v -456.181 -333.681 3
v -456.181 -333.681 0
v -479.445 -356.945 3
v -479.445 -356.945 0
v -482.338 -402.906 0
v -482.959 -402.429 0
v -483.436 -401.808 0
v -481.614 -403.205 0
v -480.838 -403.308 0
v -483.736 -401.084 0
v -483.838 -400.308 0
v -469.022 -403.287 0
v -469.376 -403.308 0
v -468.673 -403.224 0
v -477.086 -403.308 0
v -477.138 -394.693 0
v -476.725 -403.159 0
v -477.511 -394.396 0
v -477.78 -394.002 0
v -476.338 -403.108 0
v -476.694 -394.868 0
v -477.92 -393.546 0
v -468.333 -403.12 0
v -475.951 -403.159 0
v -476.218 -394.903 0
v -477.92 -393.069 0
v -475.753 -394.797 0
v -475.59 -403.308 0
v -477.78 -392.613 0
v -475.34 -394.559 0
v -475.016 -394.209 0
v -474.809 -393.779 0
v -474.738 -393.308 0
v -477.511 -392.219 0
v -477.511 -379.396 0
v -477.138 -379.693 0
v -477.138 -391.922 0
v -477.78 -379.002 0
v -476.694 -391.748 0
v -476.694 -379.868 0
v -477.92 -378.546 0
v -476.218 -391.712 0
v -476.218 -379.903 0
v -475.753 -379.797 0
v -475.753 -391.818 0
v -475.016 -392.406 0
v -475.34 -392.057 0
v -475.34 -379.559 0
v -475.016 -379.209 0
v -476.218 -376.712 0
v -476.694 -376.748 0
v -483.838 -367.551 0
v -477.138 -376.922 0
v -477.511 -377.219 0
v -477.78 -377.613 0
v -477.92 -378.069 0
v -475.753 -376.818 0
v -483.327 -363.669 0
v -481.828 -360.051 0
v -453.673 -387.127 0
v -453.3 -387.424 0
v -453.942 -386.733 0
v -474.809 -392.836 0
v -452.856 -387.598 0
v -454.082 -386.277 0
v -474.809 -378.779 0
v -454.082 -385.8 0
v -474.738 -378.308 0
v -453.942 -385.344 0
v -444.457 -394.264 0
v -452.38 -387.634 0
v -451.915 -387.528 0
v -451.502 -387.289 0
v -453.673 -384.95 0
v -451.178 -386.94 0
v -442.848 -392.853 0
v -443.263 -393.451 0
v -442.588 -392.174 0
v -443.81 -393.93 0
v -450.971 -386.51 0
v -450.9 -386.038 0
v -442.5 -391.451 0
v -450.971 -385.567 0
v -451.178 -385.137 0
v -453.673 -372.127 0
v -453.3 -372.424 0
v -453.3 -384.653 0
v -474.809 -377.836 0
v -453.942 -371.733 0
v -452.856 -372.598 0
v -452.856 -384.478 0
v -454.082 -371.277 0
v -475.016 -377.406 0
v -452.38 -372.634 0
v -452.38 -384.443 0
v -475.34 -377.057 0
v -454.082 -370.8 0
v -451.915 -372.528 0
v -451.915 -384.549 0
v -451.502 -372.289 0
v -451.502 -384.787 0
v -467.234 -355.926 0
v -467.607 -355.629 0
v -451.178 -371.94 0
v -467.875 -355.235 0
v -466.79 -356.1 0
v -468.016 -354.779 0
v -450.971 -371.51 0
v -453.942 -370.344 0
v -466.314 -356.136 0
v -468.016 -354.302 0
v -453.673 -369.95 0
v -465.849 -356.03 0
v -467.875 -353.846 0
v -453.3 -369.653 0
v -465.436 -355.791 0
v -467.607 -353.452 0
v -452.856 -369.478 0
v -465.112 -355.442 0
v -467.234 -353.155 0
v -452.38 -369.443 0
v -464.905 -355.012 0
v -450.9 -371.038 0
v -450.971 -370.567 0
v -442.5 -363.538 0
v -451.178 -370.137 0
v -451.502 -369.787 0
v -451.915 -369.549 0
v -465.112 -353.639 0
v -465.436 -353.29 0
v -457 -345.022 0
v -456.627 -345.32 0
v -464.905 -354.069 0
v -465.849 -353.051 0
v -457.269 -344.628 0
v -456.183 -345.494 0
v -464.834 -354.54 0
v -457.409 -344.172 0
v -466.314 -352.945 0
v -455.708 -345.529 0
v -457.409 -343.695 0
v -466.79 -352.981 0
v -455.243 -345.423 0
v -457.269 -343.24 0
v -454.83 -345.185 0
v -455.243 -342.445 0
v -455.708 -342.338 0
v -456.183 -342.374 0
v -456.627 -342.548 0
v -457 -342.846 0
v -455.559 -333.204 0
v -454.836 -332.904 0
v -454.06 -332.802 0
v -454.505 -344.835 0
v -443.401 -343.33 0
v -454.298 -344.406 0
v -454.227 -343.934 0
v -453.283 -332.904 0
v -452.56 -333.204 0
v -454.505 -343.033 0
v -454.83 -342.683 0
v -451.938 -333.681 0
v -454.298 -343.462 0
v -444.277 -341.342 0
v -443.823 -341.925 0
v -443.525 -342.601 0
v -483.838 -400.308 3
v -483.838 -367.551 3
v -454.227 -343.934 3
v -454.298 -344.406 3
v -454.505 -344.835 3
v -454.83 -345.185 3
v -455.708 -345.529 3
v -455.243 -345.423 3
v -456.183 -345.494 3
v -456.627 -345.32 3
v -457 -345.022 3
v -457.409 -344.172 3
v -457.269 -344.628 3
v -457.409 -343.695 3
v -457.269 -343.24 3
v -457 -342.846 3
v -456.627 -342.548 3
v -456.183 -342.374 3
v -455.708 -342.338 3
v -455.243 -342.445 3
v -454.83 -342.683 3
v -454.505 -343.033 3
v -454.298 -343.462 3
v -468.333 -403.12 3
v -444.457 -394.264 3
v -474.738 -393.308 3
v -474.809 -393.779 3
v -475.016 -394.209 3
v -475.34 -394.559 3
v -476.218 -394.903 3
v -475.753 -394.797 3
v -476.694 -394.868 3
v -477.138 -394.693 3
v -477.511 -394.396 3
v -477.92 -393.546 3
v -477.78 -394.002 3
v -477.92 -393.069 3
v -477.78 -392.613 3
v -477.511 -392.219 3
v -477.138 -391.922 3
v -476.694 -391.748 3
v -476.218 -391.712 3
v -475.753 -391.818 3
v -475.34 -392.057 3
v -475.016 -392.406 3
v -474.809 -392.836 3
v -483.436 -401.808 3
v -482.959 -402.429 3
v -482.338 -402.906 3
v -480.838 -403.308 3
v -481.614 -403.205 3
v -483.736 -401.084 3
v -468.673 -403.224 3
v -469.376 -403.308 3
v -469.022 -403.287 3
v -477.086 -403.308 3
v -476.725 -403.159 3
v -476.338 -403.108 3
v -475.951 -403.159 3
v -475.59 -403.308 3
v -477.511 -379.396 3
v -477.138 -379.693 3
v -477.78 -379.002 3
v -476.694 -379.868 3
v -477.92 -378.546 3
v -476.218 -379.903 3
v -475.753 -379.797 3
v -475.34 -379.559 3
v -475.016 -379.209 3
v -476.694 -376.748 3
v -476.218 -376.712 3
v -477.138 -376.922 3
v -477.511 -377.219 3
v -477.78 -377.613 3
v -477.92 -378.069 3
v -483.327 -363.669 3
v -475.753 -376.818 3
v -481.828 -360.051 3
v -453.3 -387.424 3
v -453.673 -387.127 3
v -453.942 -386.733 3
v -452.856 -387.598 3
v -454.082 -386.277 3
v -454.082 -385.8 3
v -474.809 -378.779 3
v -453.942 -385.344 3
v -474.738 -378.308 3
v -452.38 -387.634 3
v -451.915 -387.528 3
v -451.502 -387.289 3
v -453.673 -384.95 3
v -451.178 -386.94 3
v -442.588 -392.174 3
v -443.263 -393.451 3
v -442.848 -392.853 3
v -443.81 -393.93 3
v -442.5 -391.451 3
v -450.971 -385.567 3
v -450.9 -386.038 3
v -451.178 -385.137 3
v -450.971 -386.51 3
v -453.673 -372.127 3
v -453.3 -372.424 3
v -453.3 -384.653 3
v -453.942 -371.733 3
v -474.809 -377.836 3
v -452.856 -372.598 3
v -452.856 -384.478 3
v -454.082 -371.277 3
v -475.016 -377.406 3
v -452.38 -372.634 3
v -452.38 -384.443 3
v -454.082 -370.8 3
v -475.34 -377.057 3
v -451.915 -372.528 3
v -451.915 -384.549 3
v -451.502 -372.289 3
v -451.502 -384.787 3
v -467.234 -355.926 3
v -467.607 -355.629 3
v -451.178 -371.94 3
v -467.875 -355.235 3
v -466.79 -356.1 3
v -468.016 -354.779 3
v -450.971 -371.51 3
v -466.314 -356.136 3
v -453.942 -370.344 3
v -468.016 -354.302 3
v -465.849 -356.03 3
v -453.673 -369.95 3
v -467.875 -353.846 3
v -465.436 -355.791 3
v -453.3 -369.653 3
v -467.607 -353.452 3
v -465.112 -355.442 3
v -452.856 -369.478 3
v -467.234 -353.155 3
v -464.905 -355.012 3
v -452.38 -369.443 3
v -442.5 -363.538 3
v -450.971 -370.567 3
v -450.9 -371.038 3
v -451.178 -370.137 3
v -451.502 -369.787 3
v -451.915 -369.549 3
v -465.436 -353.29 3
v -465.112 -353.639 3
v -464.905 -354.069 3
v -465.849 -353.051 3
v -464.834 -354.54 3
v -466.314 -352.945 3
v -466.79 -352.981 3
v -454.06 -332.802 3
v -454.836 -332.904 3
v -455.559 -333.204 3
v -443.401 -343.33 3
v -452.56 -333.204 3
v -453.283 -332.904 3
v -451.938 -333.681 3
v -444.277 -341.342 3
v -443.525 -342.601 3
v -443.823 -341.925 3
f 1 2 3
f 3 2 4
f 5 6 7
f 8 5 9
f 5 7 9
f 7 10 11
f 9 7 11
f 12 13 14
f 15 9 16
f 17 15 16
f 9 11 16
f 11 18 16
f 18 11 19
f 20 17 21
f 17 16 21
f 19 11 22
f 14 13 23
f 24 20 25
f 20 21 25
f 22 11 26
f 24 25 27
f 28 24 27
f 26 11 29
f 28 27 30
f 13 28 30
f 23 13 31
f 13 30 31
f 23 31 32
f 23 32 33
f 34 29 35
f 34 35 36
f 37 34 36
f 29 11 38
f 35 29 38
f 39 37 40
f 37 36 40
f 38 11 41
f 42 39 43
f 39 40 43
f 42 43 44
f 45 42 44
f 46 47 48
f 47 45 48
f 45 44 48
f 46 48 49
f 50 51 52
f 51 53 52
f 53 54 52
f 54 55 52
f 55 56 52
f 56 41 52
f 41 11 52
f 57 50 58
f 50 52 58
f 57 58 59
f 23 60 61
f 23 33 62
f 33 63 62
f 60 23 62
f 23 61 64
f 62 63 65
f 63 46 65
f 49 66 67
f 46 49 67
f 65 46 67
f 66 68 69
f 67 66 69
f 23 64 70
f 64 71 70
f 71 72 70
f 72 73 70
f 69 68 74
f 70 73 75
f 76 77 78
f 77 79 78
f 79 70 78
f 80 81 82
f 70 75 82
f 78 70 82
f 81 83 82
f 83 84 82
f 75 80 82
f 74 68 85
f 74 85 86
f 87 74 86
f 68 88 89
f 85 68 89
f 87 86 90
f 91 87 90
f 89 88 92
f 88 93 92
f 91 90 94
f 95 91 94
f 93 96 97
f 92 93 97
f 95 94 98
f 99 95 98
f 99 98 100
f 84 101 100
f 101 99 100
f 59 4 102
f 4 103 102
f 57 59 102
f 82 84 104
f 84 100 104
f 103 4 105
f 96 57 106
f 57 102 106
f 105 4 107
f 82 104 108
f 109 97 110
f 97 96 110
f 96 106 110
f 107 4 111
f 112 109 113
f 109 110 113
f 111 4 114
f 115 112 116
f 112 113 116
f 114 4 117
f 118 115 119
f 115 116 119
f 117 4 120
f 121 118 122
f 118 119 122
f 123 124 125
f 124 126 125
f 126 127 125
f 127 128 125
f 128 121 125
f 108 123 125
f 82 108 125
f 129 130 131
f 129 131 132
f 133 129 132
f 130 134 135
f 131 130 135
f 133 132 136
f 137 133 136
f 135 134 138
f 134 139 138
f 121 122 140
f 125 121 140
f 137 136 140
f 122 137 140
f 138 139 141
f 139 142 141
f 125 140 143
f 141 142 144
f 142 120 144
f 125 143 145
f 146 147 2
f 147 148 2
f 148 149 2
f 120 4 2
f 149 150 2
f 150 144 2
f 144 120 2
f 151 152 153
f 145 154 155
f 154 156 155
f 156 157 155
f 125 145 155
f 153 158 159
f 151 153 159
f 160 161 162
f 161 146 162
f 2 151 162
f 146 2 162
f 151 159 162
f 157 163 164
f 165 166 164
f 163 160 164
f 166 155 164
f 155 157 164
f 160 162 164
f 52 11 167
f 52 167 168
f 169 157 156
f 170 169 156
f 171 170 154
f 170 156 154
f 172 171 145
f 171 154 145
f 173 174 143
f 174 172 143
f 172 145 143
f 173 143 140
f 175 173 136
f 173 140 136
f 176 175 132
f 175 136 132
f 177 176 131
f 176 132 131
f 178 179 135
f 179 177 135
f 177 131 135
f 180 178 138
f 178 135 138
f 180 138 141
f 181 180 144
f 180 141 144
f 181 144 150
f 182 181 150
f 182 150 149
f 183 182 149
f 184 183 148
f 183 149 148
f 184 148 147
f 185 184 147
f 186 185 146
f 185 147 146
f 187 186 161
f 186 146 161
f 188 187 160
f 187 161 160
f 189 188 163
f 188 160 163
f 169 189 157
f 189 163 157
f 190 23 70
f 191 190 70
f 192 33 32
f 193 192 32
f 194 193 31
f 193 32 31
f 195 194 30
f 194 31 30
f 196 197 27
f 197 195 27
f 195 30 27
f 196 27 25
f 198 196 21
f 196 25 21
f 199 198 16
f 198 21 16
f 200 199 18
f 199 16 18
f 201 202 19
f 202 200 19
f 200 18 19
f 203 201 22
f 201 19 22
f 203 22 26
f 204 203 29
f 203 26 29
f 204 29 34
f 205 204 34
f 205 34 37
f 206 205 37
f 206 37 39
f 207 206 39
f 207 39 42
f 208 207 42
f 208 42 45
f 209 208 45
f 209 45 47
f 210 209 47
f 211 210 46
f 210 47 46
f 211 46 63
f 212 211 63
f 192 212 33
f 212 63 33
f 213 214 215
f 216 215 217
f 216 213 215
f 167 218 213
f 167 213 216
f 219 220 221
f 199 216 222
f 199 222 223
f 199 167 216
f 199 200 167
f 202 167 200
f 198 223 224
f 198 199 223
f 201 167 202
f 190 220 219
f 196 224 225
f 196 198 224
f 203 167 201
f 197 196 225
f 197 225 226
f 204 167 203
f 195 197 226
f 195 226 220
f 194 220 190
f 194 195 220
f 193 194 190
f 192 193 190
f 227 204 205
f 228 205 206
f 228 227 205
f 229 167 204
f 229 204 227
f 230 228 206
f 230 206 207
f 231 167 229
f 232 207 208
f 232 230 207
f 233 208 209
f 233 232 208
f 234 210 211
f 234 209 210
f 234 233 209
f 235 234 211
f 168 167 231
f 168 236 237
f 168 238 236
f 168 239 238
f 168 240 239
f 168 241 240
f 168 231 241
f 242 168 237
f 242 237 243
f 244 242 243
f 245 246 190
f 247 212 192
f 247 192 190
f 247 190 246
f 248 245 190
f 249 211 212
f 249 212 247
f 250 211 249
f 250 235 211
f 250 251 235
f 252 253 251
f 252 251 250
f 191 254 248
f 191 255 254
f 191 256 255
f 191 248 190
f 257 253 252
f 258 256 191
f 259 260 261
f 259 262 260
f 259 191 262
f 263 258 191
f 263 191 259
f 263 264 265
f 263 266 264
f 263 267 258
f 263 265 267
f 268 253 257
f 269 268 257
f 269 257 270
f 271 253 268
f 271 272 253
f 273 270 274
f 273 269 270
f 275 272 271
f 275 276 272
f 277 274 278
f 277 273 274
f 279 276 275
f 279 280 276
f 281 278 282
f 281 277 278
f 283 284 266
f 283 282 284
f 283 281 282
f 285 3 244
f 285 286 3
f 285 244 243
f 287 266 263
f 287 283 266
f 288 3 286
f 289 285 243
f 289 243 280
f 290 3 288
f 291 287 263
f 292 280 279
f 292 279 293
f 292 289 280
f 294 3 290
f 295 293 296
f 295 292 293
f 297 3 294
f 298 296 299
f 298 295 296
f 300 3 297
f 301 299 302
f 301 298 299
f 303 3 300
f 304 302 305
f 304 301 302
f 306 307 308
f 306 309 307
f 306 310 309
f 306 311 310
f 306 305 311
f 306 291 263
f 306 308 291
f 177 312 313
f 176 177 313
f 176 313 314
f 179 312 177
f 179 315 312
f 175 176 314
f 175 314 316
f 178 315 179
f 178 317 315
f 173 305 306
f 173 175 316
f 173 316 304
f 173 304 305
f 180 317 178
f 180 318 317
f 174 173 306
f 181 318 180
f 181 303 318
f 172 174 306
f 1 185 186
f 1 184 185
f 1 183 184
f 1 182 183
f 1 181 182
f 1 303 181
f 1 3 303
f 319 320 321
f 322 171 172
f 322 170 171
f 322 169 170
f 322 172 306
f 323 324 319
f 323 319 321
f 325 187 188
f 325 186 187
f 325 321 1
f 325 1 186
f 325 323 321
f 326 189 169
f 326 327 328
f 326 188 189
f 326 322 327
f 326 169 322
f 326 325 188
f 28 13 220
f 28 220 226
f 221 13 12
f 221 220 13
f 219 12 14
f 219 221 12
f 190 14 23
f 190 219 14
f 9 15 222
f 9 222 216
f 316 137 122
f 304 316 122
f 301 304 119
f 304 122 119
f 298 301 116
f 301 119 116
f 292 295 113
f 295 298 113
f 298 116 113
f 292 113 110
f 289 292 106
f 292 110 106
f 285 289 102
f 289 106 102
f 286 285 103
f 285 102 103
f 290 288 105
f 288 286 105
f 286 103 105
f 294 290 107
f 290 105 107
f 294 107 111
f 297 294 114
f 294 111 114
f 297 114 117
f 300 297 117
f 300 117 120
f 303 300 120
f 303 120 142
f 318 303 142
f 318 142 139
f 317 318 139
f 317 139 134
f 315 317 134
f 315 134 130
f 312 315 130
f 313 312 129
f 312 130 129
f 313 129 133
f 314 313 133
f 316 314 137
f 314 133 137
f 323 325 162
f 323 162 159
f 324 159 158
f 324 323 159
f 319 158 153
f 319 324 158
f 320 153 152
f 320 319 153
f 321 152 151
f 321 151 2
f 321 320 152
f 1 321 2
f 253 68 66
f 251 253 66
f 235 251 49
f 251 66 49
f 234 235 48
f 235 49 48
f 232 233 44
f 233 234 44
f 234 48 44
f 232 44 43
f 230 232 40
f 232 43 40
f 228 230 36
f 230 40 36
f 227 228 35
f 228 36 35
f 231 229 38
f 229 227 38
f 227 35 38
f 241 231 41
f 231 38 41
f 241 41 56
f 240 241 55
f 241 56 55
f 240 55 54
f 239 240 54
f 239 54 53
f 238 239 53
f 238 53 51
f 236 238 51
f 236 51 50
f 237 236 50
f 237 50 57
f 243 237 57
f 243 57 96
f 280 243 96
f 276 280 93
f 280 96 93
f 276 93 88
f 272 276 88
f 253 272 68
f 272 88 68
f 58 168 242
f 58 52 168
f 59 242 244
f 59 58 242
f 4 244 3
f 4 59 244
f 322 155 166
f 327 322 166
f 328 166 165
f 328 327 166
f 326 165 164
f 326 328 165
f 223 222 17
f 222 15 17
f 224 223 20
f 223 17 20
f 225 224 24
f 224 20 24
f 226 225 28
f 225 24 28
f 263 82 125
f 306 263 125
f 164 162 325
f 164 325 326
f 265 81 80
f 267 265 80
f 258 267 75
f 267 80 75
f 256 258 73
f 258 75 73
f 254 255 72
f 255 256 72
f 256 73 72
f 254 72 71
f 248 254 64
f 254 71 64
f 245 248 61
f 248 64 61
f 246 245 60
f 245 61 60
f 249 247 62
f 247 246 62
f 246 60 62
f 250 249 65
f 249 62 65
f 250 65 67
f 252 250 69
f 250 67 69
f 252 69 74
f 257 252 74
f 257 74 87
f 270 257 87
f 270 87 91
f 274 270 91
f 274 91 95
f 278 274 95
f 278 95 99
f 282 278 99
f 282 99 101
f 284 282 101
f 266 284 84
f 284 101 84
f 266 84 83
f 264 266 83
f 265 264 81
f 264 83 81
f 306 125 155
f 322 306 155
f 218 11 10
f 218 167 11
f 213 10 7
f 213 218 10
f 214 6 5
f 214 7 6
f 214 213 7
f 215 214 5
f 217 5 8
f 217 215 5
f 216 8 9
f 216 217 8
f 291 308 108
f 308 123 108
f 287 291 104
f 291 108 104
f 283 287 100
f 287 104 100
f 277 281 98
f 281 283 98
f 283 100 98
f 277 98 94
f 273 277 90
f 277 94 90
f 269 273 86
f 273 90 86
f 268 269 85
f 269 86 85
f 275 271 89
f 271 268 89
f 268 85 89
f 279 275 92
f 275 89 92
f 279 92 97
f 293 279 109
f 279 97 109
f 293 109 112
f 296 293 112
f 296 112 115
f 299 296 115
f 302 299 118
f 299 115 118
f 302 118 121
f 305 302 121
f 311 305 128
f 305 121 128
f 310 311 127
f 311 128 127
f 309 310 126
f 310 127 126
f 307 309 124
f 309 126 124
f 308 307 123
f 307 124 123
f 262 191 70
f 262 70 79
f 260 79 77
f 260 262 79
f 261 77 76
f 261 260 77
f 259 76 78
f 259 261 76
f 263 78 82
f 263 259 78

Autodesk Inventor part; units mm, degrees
ref_plane "YZ Plane" through (0, 0, 0) normal (1, 0, 0) x (0, 1, 0)
ref_plane "XZ Plane" through (0, 0, 0) normal (0, 1, 0) x (-1, 0, 0)
ref_plane "XY Plane" through (0, 0, 0) normal (0, 0, 1) x (1, 0, 0)
sketch "スケッチ1" plane through (0, 0, 0) normal (0, 0, 1) x (1, 0, 0)
  line L0 (67.5, 17.5) -> (-67.5, 17.5) construction
  line L1 (-67.5, 17.5) -> (-67.5, -17.5) construction
  line L2 (-67.5, -17.5) -> (67.5, -17.5) construction
  line L3 (67.5, -17.5) -> (67.5, 17.5) construction
  line L4 (67.5, 17.5) -> (-67.5, -17.5) construction
  line L5 (-67.5, 17.5) -> (67.5, -17.5) construction
  circle A0 centre (-60, 35) radius 1.6
  circle A1 centre (-70, 35) radius 1.6
  line L6 (-77.5, 27.5) -> (-53, 27.5)
  line L7 (-53, 27.5) -> (-53, 42.5)
  line L8 (-53, 42.5) -> (-80, 42.5) construction
  line L9 (-77.5, 27.5) -> (-77.5, -27.5)
  line L10 (-77.5, -27.5) -> (-53, -27.5)
  line L11 (-53, -27.5) -> (-53, -42.5)
  line L12 (-53, -42.5) -> (-80, -42.5)
  circle A2 centre (-60, -35) radius 1.6
  circle A3 centre (-70, -35) radius 1.6
  circle A4 centre (-80, -35) radius 1.6
  line L13 (124.2308, -31.7536) -> (484.5935, -392.1164)
  line L14 (484.5935, -392.1164) -> (488.7129, -553.575)
  line L15 (-80, 21.2868) -> (-468.838, -367.5512) construction
  line L16 (-468.838, -367.5512) -> (-479.4446, -356.9446) construction
  line L17 (-479.4446, -356.9446) -> (-90.6066, 31.8934) construction
  line L18 (-90.6066, 31.8934) -> (-80, 21.2868) construction
  line L19 (-80, 42.5) -> (-80, 5.3052) construction
  circle A5 centre (-92.3744, 19.519) radius 1.6
  circle A6 centre (-102.981, 8.9124) radius 1.6
  circle A7 centre (-113.5876, -1.6942) radius 1.6
  line L20 (-92.3744, 19.519) -> (-113.5876, -1.6942) construction
  circle A8 centre (-466.4339, -354.5405) radius 1.6
  circle A9 centre (-455.8273, -343.9339) radius 1.6
  line L21 (-388.4374, -772.2067) -> (-358.1265, -754.7067) construction
  line L22 (-358.1265, -754.7067) -> (-425.6265, -637.7933) construction
  line L23 (-455.9374, -655.2933) -> (-358.1265, -754.7067) construction
  line L24 (-388.4374, -772.2067) -> (-425.6265, -637.7933) construction
  line L25 (-455.9374, -655.2933) -> (-388.4374, -772.2067) construction
  line L26 (-425.6265, -637.7933) -> (-455.9374, -655.2933) construction
  line L27 (455.9374, -655.2933) -> (425.6265, -637.7933) construction
  line L28 (425.6265, -637.7933) -> (358.1265, -754.7067) construction
  line L29 (388.4374, -772.2067) -> (425.6265, -637.7933) construction
  line L30 (455.9374, -655.2933) -> (358.1265, -754.7067) construction
  line L31 (388.4374, -772.2067) -> (455.9374, -655.2933) construction
  line L32 (358.1265, -754.7067) -> (388.4374, -772.2067) construction
  line L33 (0, 0) -> (0, -263.4473) construction
  circle A10 centre (80, -35) radius 1.6
  line L34 (67.5, 17.5) -> (67.5, -17.5) construction
  line L35 (77.5, 27.5) -> (53, 27.5)
  line L36 (77.5, 27.5) -> (77.5, -27.5)
  line L37 (77.5, -27.5) -> (53, -27.5)
  circle A11 centre (60, -35) radius 1.6
  circle A12 centre (70, -35) radius 1.6
  line L38 (53, -27.5) -> (53, -42.5)
  line L39 (53, -42.5) -> (80, -42.5)
  circle A13 centre (60, 35) radius 1.6
  circle A14 centre (70, 35) radius 1.6
  line L40 (80, 42.5) -> (80, 5.3052) construction
  line L41 (53, 42.5) -> (80, 42.5)
  line L42 (53, 27.5) -> (53, 42.5)
  line L43 (-392.0976, -785.867) -> (-404.3476, -764.6493)
  line L44 (-388.4374, -772.2067) -> (-358.1265, -754.7067) construction
  line L45 (-392.0976, -785.867) -> (-344.4662, -758.367)
  circle A15 centre (-336.7211, -756.782) radius 1.6
  circle A16 centre (-341.7211, -748.1218) radius 1.6
  line L46 (-343.7259, -729.6493) -> (-330.2259, -753.032)
  circle A17 centre (-346.7211, -739.4615) radius 1.6
  line L47 (-356.7162, -737.1493) -> (-343.7259, -729.6493)
  line L48 (-344.4662, -758.367) -> (-356.7162, -737.1493)
  circle A18 centre (-407.3428, -774.4615) radius 1.6
  circle A19 centre (-402.3428, -783.1218) radius 1.6
  line L49 (-404.3476, -764.6493) -> (-417.338, -772.1493)
  line L50 (-417.338, -772.1493) -> (-403.838, -795.532)
  line L51 (-403.838, -795.532) -> (-371.6264, -776.9346) construction
  line L52 (-425.6265, -637.7933) -> (-455.9374, -655.2933) construction
  line L53 (-409.7162, -645.3507) -> (-396.7259, -637.8507)
  circle A20 centre (-406.7211, -635.5385) radius 1.6
  line L54 (-455.9374, -655.2933) -> (-425.6265, -637.7933) construction
  circle A21 centre (-411.7211, -626.8782) radius 1.6
  line L55 (-469.5976, -651.633) -> (-421.9662, -624.133)
  line L56 (-421.9662, -624.133) -> (-409.7162, -645.3507)
  line L57 (-396.7259, -637.8507) -> (-410.2259, -614.468)
  circle A22 centre (-416.7211, -618.218) radius 1.6
  line L58 (-469.5976, -651.633) -> (-457.3476, -672.8507)
  circle A23 centre (-467.3428, -670.5385) radius 1.6
  circle A24 centre (-472.3428, -661.8782) radius 1.6
  line L59 (-483.838, -656.968) -> (-451.6264, -638.3706) construction
  line L60 (-470.338, -680.3507) -> (-483.838, -656.968)
  line L61 (-457.3476, -672.8507) -> (-470.338, -680.3507)
  line L62 (469.5976, -651.633) -> (457.3476, -672.8507)
  line L63 (455.9374, -655.2933) -> (425.6265, -637.7933) construction
  line L64 (469.5976, -651.633) -> (421.9662, -624.133)
  circle A25 centre (416.7211, -618.218) radius 1.6
  circle A26 centre (411.7211, -626.8782) radius 1.6
  line L65 (396.7259, -637.8507) -> (410.2259, -614.468)
  circle A27 centre (406.7211, -635.5385) radius 1.6
  line L66 (409.7162, -645.3507) -> (396.7259, -637.8507)
  line L67 (421.9662, -624.133) -> (409.7162, -645.3507)
  circle A28 centre (467.3428, -670.5385) radius 1.6
  circle A29 centre (472.3428, -661.8782) radius 1.6
  line L68 (457.3476, -672.8507) -> (470.338, -680.3507)
  line L69 (470.338, -680.3507) -> (483.838, -656.968)
  line L70 (483.838, -656.968) -> (451.6264, -638.3706) construction
  line L71 (358.1265, -754.7067) -> (388.4374, -772.2067) construction
  line L72 (356.7162, -737.1493) -> (343.7259, -729.6493)
  circle A30 centre (346.7211, -739.4615) radius 1.6
  line L73 (388.4374, -772.2067) -> (358.1265, -754.7067) construction
  circle A31 centre (341.7211, -748.1218) radius 1.6
  line L74 (392.0976, -785.867) -> (344.4662, -758.367)
  line L75 (344.4662, -758.367) -> (356.7162, -737.1493)
  line L76 (343.7259, -729.6493) -> (330.2259, -753.032)
  circle A32 centre (336.7211, -756.782) radius 1.6
  line L77 (392.0976, -785.867) -> (404.3476, -764.6493)
  circle A33 centre (407.3428, -774.4615) radius 1.6
  circle A34 centre (402.3428, -783.1218) radius 1.6
  line L78 (403.838, -795.532) -> (371.6264, -776.9346) construction
  line L79 (417.338, -772.1493) -> (403.838, -795.532)
  line L80 (404.3476, -764.6493) -> (417.338, -772.1493)
  line L81 (-483.838, -367.5512) -> (-468.838, -367.5512) construction
  line L82 (-468.838, -367.5512) -> (-468.838, -648.3077) construction
  line L83 (-468.838, -648.3077) -> (-483.838, -648.3077)
  line L84 (-483.838, -648.3077) -> (-483.838, -367.5512) construction
  line L85 (-283.2277, -604.4352) -> (-262.2277, -640.8083) construction
  line L86 (345.2492, -497.0108) -> (305.7786, -565.3759) construction
  line L87 (265.1134, -631.6538) -> (-234.8866, -631.6538) construction
  line L88 (-234.8866, -631.6538) -> (-234.8866, -1131.6538) construction
  line L89 (-234.8866, -1131.6538) -> (265.1134, -1131.6538) construction
  line L90 (265.1134, -1131.6538) -> (265.1134, -631.6538) construction
  line L91 (265.1134, -631.6538) -> (-234.8866, -1131.6538) construction
  line L92 (-234.8866, -631.6538) -> (265.1134, -1131.6538) construction
  line L93 (-12.841, -157.5) -> (15.1134, -157.5) construction
  circle A35 centre (1.1362, -409.4569) radius 212.5 construction
  line L94 (501.1362, 53.616) -> (-498.8638, 53.616) construction
  line L95 (-498.8638, 53.616) -> (-498.8638, -946.384) construction
  line L96 (-498.8638, -946.384) -> (501.1362, -946.384) construction
  line L97 (501.1362, -946.384) -> (501.1362, 53.616) construction
  line L98 (501.1362, 53.616) -> (-498.8638, -946.384) construction
  line L99 (-498.8638, 53.616) -> (501.1362, -946.384) construction
  circle A36 centre (1.1362, -409.4569) radius 250 construction
  line L100 (-80, 42.5) -> (-90.6066, 31.8934) construction
  line L101 (-80, 42.5) -> (-118.8909, 3.6091)
  line L102 (-118.8909, -6.9975) -> (-113.5876, -12.3008)
  line L103 (-113.5876, -12.3008) -> (-85.2767, -40.3298)
  arc A37 (-118.8909, 3.6091) -> (-118.8909, -6.9975) centre (-113.5876, -1.6942) ccw
  arc A38 (-85.2767, -40.3298) -> (-80, -42.5) centre (-80, -35) ccw
  line L104 (-80, 42.5) -> (-53, 42.5)
  line L105 (-466.4339, -354.5405) -> (-455.8273, -343.9339) construction
  circle A39 centre (-476.338, -638.3077) radius 1.6
  circle A40 centre (-476.338, -623.3077) radius 1.6
  circle A41 centre (-476.338, -378.3077) radius 1.6
  circle A42 centre (-476.338, -393.3077) radius 1.6
  line L106 (-454.0595, -331.5595) -> (-443.4529, -342.1661)
  line L107 (-468.838, -403.3077) -> (-475.5897, -403.3077)
  line L108 (-483.838, -403.3077) -> (-483.838, -367.5512)
  line L109 (-454.0595, -331.5595) -> (-479.4446, -356.9446)
  arc A43 (-479.4446, -356.9446) -> (-483.838, -367.5512) centre (-468.838, -367.5512) ccw
  arc A44 (-475.5897, -403.3077) -> (-477.0864, -403.3077) centre (-476.338, -404.6077) ccw
  line L110 (-475.5897, -403.3077) -> (-477.0864, -403.3077) construction
  line L111 (-477.0864, -403.3077) -> (-483.838, -403.3077)
  circle A45 centre (-452.5, -386.0383) radius 1.6
  circle A46 centre (-452.5, -371.0383) radius 1.6
  circle A47 centre (-262.5, -371.0383) radius 1.6 construction
  line L112 (-462.5, -393.5383) -> (-274.6134, -393.5383) construction
  line L113 (-274.6134, -393.5383) -> (-274.6134, -363.5383) construction
  line L114 (-274.6134, -363.5383) -> (-462.5, -363.5383) construction
  line L115 (-462.5, -363.5383) -> (-462.5, -393.5383) construction
  line L116 (-442.5, -393.5383) -> (-442.5, -363.5383)
  line L117 (-468.838, -403.3077) -> (-442.5, -393.5383)
  line L118 (-442.5, -363.5383) -> (-443.4529, -342.1661)
  point P0 (0, -470)
  point P1 (-102.981, 8.9124)
  point P2 (-77.5, 0)
  point P3 (-407.0319, -705)
  point P4 (-407.0319, -705)
  point P5 (407.0319, -705)
  point P6 (407.0319, -705)
  point P7 (77.5, 0)
  point P8 (-368.2819, -772.117)
  point P9 (-385.4668, -784.9254)
  point P10 (-445.7819, -637.883)
  point P11 (445.7819, -637.883)
  point P12 (465.4668, -646.3614)
  point P13 (368.2819, -772.117)
  point P14 (15.1134, -881.6538)
  point P15 (1.1362, -446.384)
  point P16 (-124.1942, -1.6942)
  point P17 (-476.338, -648.3077)
  point P18 (-476.338, -367.5512)
  dimension "d4" = 135
  dimension "d5" = 35
  dimension "d6" = 3.2
  dimension "d7" = 3.2
  dimension "d8" = 10
  dimension "d9" = 15
  dimension "d10" = 10
  dimension "d11" = 7.5
  dimension "d12" = 7
  dimension "d13" = 70
  dimension "d14" = 3.2
  dimension "d15" = 3.2
  dimension "d16" = 3.2
  dimension "d17" = 10
  dimension "d18" = 10
  dimension "d19" = 7
  dimension "d20" = 15
  dimension "d21" = 7.5
  dimension "d22" = 10
  dimension "d23" = 10
  dimension "d24" = 135
  dimension "d25" = 15
  dimension "d26" = 10
  dimension "d27" = 3.2
  dimension "d28" = 3.2
  dimension "d29" = 3.2
  dimension "d30" = 10
  dimension "d31" = 15
  dimension "d32" = 15
  dimension "d33" = 7.5
  dimension "d34" = 45
  dimension "d35" = 3.2
  dimension "d36" = 3.2
  dimension "d37" = 360
  dimension "d38" = 360
  dimension "d39" = 470
  dimension "d40" = 15
  dimension "d41" = 200
  dimension "d42" = 200
  dimension "d43" = 500
  dimension "d44" = 500
  dimension "d45" = 200
  dimension "d46" = 425
  dimension "d47" = 1000
  dimension "d48" = 1000
  dimension "d49" = 42
  dimension "d50" = 500
  dimension "d51" = 7.5
  dimension "d52" = 7.5
  dimension "d53" = 7.5
  dimension "d54" = 484
  dimension "d55" = 15
  dimension "d56" = 3.2
  dimension "d57" = 3.2
  dimension "d58" = 10
  dimension "d59" = 15
  dimension "d60" = 3.2
  dimension "d61" = 3.2
  dimension "d62" = 15
  dimension "d63" = 230
  dimension "d64" = 10
  dimension "d65" = 10
  dimension "d69" = 3
  dimension "d70" = 1.3
extrude "押し出し1" add sketch "スケッチ1" along normal blind 3 contours L106 L118 L116 L117 L107 A44 L111 L108 A43 L109
fillet "フィレット2" radius 3 6 edges at (-483.838, -403.3077, 1.5) (-468.838, -403.3077, 1.5) (-442.5, -393.5383, 1.5) (-442.5, -363.5383, 1.5) (-443.4529, -342.1661, 1.5) (-454.0595, -331.5595, 1.5)
properties part number "オムニ_固定具1" material "アルミニウム 6061"
